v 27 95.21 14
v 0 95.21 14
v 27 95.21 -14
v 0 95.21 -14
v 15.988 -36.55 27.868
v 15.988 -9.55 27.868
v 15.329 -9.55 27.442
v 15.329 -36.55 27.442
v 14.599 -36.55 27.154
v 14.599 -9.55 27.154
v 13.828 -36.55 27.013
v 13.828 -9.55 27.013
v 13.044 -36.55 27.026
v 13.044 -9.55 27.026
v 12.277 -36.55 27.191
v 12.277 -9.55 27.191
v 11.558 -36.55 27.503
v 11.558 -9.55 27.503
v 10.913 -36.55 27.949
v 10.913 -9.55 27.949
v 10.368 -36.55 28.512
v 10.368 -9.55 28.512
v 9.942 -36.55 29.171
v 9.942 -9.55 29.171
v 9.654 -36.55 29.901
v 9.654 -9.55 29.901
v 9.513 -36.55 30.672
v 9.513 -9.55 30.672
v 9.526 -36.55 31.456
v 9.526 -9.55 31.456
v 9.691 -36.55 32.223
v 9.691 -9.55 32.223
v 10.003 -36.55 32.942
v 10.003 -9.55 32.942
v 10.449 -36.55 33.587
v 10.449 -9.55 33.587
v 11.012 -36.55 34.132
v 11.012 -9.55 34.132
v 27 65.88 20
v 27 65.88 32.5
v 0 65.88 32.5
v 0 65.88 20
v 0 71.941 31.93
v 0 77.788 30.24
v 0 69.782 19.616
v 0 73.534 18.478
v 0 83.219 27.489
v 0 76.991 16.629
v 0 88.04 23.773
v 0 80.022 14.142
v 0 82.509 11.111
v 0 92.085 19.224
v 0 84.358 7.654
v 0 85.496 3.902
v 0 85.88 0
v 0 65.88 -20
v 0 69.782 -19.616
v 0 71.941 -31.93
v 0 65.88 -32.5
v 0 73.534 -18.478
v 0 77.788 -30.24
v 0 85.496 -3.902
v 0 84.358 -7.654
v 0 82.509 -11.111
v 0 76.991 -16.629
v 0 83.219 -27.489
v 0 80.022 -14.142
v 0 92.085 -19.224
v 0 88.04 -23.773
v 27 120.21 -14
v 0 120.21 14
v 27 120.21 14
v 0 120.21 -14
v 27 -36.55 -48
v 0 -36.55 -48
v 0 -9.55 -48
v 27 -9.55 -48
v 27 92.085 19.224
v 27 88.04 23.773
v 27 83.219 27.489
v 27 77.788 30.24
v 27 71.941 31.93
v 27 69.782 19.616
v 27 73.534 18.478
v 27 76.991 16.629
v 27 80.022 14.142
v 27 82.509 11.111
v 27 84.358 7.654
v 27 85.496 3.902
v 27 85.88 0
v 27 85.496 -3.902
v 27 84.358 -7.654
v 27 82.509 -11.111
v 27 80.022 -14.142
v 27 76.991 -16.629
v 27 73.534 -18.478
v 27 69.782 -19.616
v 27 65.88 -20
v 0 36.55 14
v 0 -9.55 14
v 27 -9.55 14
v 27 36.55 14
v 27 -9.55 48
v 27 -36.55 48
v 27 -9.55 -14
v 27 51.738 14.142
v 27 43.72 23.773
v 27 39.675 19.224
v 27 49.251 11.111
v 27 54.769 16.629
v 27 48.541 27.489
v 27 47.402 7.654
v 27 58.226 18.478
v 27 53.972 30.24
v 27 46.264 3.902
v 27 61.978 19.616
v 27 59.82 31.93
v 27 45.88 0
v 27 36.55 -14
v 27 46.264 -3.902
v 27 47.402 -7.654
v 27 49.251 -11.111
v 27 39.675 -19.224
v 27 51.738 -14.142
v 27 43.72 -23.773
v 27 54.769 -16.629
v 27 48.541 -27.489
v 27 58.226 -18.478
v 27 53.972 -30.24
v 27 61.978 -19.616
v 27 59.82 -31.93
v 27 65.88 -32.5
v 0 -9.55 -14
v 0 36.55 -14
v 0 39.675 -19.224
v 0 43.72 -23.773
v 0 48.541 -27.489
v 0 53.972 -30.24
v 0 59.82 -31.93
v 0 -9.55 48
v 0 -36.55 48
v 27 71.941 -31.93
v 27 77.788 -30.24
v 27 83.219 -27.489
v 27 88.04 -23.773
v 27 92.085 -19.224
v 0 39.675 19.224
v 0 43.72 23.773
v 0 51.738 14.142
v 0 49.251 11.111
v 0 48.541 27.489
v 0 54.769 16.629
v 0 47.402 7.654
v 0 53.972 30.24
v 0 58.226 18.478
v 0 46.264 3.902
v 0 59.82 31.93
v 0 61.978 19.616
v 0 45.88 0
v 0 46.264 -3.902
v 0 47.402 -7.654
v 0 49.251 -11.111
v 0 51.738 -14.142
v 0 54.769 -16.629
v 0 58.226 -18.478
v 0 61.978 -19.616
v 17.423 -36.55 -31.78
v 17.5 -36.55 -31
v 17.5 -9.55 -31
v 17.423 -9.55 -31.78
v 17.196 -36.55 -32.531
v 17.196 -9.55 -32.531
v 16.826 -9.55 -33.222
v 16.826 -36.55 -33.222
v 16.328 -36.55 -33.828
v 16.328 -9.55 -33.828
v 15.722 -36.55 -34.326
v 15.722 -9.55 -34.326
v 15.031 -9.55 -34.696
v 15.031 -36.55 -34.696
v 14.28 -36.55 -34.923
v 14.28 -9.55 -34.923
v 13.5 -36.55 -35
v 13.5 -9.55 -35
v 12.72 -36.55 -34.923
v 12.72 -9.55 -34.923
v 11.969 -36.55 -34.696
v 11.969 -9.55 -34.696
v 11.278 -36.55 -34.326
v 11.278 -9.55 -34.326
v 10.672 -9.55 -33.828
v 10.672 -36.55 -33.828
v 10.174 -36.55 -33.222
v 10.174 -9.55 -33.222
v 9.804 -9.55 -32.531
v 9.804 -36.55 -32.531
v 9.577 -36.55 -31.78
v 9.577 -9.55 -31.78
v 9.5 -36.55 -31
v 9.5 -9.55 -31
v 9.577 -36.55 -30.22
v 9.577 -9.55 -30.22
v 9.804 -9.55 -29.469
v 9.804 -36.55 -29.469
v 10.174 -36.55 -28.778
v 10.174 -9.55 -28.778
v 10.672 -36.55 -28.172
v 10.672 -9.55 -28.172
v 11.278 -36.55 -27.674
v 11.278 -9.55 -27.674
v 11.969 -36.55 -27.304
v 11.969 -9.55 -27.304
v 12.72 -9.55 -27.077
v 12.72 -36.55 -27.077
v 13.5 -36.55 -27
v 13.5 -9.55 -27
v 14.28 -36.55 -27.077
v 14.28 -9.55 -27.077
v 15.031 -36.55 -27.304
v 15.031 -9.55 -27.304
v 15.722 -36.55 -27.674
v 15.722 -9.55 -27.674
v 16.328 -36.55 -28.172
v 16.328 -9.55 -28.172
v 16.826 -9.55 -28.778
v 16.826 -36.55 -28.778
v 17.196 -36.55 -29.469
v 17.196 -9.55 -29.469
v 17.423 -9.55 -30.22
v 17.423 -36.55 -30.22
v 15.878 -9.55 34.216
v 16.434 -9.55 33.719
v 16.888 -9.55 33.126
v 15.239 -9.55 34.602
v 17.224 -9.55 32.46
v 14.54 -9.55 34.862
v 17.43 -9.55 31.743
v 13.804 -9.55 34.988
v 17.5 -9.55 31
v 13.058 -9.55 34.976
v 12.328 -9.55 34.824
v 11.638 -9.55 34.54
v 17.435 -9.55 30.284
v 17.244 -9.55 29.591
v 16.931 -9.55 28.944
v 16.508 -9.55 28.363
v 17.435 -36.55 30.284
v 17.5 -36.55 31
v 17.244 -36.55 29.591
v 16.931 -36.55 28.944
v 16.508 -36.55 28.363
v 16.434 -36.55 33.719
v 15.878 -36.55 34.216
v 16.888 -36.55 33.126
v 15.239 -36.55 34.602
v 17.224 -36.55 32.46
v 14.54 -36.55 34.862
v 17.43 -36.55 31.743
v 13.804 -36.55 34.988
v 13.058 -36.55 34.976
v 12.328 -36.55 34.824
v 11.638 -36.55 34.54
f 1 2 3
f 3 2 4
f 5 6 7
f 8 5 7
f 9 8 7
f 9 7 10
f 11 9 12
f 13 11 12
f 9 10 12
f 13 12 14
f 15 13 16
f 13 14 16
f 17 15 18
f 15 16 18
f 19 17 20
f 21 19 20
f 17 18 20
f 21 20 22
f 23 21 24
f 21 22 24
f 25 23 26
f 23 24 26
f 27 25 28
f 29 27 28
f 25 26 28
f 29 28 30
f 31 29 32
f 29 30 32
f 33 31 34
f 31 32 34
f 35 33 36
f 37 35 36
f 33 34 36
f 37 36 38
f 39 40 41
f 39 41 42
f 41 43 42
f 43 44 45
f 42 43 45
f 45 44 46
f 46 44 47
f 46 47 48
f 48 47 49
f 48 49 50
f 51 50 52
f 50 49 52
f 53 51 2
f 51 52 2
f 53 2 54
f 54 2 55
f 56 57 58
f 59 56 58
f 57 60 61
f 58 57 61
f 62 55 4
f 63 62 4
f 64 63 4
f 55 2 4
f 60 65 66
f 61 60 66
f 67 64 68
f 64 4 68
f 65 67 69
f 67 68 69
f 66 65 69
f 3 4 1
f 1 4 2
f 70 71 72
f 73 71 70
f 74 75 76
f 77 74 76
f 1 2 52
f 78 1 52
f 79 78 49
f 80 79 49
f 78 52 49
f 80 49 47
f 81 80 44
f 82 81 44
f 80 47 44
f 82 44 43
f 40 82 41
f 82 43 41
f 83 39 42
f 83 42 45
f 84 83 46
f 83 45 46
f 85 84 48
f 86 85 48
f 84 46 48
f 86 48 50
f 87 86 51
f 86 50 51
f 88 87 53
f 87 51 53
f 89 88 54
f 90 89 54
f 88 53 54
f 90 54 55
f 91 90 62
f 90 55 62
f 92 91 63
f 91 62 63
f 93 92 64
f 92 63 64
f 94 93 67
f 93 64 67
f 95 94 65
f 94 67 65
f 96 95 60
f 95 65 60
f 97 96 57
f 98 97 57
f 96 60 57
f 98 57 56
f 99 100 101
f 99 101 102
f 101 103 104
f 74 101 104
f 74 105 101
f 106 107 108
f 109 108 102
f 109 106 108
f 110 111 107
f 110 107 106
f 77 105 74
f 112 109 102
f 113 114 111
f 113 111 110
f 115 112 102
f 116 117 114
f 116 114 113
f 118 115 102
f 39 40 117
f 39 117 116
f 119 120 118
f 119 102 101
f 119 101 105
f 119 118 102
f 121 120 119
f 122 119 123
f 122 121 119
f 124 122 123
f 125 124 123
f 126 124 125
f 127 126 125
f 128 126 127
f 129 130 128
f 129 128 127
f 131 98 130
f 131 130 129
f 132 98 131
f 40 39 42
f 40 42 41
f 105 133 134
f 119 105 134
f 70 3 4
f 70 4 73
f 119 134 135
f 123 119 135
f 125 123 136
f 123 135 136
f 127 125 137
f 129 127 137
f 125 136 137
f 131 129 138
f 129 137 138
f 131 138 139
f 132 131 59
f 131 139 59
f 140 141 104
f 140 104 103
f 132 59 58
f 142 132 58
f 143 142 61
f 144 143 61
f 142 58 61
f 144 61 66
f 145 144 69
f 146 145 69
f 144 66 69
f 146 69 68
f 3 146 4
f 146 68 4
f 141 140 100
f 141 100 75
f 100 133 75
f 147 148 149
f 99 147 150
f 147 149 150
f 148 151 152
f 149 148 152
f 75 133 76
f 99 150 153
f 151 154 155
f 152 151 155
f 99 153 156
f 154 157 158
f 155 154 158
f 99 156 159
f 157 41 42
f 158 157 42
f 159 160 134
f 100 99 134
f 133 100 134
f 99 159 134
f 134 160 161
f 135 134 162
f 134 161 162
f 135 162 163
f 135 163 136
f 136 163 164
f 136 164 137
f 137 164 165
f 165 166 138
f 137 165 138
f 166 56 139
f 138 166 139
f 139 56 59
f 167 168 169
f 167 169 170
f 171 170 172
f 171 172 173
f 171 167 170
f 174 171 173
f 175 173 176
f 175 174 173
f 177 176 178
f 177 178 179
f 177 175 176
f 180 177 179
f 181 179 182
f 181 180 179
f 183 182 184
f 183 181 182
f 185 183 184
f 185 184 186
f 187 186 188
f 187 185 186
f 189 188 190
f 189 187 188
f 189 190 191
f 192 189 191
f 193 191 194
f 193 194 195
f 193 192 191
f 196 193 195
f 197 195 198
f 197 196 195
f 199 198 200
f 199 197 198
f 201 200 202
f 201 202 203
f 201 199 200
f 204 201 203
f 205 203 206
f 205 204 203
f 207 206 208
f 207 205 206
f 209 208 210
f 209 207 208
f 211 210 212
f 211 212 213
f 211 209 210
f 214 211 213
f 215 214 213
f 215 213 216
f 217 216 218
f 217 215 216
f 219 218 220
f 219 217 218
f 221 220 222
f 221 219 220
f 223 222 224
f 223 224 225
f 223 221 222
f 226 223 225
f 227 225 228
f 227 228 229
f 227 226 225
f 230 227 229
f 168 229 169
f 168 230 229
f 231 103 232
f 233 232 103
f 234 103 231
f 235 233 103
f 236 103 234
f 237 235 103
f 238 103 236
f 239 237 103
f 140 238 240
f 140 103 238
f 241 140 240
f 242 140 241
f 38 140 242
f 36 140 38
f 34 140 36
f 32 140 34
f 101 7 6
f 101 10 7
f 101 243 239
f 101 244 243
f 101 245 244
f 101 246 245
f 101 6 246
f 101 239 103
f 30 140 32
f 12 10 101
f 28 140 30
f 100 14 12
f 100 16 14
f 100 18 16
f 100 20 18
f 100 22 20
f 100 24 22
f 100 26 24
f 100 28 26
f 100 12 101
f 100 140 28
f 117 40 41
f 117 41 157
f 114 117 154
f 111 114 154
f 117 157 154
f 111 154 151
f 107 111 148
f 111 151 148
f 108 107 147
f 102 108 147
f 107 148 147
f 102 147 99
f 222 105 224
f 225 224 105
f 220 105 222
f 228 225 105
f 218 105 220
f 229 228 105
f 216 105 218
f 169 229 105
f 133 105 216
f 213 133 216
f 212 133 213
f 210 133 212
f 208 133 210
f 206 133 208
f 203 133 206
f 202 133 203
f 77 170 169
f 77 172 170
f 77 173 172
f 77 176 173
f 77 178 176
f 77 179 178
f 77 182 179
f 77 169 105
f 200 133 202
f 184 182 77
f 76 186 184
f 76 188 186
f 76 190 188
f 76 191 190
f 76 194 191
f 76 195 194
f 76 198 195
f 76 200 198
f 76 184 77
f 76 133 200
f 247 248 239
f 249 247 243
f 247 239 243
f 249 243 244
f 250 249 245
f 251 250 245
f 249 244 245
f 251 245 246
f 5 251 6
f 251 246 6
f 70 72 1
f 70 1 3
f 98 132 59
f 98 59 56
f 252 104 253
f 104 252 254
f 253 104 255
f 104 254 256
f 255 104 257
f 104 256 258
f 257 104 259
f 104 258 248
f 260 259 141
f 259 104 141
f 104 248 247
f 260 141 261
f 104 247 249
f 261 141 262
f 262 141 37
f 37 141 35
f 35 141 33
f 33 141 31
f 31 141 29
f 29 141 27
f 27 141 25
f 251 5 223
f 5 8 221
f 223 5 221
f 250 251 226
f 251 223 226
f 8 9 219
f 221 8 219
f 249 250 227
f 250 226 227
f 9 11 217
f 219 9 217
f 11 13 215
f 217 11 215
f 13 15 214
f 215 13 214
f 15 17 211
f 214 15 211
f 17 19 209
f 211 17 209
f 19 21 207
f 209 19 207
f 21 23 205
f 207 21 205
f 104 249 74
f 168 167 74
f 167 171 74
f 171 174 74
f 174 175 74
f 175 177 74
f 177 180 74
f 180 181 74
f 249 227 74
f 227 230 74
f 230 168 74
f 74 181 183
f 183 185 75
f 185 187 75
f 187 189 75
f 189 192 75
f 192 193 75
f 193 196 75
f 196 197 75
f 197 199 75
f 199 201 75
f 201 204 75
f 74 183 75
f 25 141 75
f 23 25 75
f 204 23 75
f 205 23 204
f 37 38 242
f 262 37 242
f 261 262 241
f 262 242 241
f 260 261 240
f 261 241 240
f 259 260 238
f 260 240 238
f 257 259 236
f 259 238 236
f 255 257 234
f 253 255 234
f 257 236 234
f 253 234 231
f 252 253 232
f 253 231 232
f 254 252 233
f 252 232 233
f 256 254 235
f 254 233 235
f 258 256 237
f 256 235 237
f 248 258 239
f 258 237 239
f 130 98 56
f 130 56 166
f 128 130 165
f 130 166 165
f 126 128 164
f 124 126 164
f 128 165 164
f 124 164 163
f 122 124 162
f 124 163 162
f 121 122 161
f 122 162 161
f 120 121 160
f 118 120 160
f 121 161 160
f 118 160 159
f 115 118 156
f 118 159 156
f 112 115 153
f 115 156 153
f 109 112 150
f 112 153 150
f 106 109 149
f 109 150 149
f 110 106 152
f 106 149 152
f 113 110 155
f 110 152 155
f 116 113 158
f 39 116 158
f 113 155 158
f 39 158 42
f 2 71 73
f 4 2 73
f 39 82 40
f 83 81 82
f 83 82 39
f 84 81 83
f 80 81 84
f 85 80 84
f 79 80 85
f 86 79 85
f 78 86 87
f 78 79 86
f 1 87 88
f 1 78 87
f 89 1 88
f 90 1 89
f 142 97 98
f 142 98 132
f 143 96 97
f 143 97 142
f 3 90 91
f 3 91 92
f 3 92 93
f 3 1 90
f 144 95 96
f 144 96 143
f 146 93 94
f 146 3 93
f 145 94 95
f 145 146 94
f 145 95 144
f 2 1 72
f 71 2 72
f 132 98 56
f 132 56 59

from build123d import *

# Parameters (mm, degrees)
SKETCH2_W              = 34
SKETCH2_H              = 27
SKETCH2_W_2            = 28
SKETCH2_H_2            = 73.1
BOSS_EXTRUDE1_DEPTH    = 27
CUT_EXTRUDE1_DEPTH     = 27
CUT_EXTRUDE2_START     = -36.55
CUT_EXTRUDE2_OUTLINE_R = 4
CUT_EXTRUDE2_DEPTH     = 27
BOSS_EXTRUDE3_DEPTH    = 27
SKETCH2_4_W            = 28
SKETCH2_4_H            = 25
BOSS_EXTRUDE4_DEPTH    = 27


# Read off the part's stored shape, not the designer's step: Cut-Extrude2
with BuildPart() as part:
    # Sketch2 → Boss-Extrude1 (new body)
    with BuildSketch(Plane(origin=(0, 0, 0), x_dir=(0, 0, -1), z_dir=(1, 0, 0))):
        with Locations((-31, -23.05)):
            Rectangle(SKETCH2_W, SKETCH2_H)
        Rectangle(SKETCH2_W_2, SKETCH2_H_2)
        with Locations((31, -23.05)):
            Rectangle(SKETCH2_W, SKETCH2_H)
        with BuildLine():
            ThreePointArc((-32.5, 65.880018752), (-27.488634015, 48.541477868), (-14, 36.55))
            Line((-14, 36.55), (14, 36.55))
            ThreePointArc((14, 36.55), (27.488634015, 48.541477868), (32.5, 65.880018752))
            Line((32.5, 65.880018752), (20, 65.880018752))
            ThreePointArc((20, 65.880018752), (0, 45.880018752), (-20, 65.880018752))
            Line((-20, 65.880018752), (-32.5, 65.880018752))
        make_face()
    extrude(amount=BOSS_EXTRUDE1_DEPTH)

    # Sketch3 → Cut-Extrude1 (cut)
    with BuildSketch(Plane(origin=(0, -9.55, 0), x_dir=(1, 0, 0), z_dir=(0, 1, 0))):
        with BuildLine():
            ThreePointArc((15.987528574, -27.86755661), (10.36755661, -28.512471426), (11.012471426, -34.13244339))
            Line((11.012471426, -34.13244339), (15.987528574, -27.86755661))
        make_face()
        with BuildLine():
            Line((15.987528574, -27.86755661), (11.012471426, -34.13244339))
            ThreePointArc((11.012471426, -34.13244339), (15.239236284, -34.602090664), (17.5, -31))
            ThreePointArc((17.5, -31), (17.102090664, -29.260763716), (15.987528574, -27.86755661))
        make_face()
    extrude(amount=-CUT_EXTRUDE1_DEPTH, mode=Mode.SUBTRACT)

    # Cut-Extrude2 outline → Cut-Extrude2 (cut)
    with BuildSketch(Plane(origin=(0, 0, 0), x_dir=(1, 0, 0), z_dir=(0, 1, 0)).offset(CUT_EXTRUDE2_START)):
        with Locations((13.5, 31)):
            Circle(CUT_EXTRUDE2_OUTLINE_R)
    extrude(amount=CUT_EXTRUDE2_DEPTH, mode=Mode.SUBTRACT)


with BuildPart() as body_2:
    # Sketch2<3> → Boss-Extrude3 (new body)
    with BuildSketch(Plane(origin=(0, 0, 0), x_dir=(0, 0, -1), z_dir=(1, 0, 0))):
        with BuildLine():
            ThreePointArc((-14, 95.210037504), (-27.488634015, 83.218559637), (-32.5, 65.880018752))
            Line((-32.5, 65.880018752), (-20, 65.880018752))
            ThreePointArc((-20, 65.880018752), (0, 85.880018752), (20, 65.880018752))
            Line((20, 65.880018752), (32.5, 65.880018752))
            ThreePointArc((32.5, 65.880018752), (27.488634015, 83.218559637), (14, 95.210037504))
            Line((14, 95.210037504), (-14, 95.210037504))
        make_face()
    extrude(amount=BOSS_EXTRUDE3_DEPTH)


with BuildPart() as body_3:
    # Sketch2<4> → Boss-Extrude4 (new body)
    with BuildSketch(Plane(origin=(0, 0, 0), x_dir=(0, 0, -1), z_dir=(1, 0, 0))):
        with Locations((0, 107.710037504)):
            Rectangle(SKETCH2_4_W, SKETCH2_4_H)
    extrude(amount=BOSS_EXTRUDE4_DEPTH)


solid = Compound([part.part, body_2.part, body_3.part])
